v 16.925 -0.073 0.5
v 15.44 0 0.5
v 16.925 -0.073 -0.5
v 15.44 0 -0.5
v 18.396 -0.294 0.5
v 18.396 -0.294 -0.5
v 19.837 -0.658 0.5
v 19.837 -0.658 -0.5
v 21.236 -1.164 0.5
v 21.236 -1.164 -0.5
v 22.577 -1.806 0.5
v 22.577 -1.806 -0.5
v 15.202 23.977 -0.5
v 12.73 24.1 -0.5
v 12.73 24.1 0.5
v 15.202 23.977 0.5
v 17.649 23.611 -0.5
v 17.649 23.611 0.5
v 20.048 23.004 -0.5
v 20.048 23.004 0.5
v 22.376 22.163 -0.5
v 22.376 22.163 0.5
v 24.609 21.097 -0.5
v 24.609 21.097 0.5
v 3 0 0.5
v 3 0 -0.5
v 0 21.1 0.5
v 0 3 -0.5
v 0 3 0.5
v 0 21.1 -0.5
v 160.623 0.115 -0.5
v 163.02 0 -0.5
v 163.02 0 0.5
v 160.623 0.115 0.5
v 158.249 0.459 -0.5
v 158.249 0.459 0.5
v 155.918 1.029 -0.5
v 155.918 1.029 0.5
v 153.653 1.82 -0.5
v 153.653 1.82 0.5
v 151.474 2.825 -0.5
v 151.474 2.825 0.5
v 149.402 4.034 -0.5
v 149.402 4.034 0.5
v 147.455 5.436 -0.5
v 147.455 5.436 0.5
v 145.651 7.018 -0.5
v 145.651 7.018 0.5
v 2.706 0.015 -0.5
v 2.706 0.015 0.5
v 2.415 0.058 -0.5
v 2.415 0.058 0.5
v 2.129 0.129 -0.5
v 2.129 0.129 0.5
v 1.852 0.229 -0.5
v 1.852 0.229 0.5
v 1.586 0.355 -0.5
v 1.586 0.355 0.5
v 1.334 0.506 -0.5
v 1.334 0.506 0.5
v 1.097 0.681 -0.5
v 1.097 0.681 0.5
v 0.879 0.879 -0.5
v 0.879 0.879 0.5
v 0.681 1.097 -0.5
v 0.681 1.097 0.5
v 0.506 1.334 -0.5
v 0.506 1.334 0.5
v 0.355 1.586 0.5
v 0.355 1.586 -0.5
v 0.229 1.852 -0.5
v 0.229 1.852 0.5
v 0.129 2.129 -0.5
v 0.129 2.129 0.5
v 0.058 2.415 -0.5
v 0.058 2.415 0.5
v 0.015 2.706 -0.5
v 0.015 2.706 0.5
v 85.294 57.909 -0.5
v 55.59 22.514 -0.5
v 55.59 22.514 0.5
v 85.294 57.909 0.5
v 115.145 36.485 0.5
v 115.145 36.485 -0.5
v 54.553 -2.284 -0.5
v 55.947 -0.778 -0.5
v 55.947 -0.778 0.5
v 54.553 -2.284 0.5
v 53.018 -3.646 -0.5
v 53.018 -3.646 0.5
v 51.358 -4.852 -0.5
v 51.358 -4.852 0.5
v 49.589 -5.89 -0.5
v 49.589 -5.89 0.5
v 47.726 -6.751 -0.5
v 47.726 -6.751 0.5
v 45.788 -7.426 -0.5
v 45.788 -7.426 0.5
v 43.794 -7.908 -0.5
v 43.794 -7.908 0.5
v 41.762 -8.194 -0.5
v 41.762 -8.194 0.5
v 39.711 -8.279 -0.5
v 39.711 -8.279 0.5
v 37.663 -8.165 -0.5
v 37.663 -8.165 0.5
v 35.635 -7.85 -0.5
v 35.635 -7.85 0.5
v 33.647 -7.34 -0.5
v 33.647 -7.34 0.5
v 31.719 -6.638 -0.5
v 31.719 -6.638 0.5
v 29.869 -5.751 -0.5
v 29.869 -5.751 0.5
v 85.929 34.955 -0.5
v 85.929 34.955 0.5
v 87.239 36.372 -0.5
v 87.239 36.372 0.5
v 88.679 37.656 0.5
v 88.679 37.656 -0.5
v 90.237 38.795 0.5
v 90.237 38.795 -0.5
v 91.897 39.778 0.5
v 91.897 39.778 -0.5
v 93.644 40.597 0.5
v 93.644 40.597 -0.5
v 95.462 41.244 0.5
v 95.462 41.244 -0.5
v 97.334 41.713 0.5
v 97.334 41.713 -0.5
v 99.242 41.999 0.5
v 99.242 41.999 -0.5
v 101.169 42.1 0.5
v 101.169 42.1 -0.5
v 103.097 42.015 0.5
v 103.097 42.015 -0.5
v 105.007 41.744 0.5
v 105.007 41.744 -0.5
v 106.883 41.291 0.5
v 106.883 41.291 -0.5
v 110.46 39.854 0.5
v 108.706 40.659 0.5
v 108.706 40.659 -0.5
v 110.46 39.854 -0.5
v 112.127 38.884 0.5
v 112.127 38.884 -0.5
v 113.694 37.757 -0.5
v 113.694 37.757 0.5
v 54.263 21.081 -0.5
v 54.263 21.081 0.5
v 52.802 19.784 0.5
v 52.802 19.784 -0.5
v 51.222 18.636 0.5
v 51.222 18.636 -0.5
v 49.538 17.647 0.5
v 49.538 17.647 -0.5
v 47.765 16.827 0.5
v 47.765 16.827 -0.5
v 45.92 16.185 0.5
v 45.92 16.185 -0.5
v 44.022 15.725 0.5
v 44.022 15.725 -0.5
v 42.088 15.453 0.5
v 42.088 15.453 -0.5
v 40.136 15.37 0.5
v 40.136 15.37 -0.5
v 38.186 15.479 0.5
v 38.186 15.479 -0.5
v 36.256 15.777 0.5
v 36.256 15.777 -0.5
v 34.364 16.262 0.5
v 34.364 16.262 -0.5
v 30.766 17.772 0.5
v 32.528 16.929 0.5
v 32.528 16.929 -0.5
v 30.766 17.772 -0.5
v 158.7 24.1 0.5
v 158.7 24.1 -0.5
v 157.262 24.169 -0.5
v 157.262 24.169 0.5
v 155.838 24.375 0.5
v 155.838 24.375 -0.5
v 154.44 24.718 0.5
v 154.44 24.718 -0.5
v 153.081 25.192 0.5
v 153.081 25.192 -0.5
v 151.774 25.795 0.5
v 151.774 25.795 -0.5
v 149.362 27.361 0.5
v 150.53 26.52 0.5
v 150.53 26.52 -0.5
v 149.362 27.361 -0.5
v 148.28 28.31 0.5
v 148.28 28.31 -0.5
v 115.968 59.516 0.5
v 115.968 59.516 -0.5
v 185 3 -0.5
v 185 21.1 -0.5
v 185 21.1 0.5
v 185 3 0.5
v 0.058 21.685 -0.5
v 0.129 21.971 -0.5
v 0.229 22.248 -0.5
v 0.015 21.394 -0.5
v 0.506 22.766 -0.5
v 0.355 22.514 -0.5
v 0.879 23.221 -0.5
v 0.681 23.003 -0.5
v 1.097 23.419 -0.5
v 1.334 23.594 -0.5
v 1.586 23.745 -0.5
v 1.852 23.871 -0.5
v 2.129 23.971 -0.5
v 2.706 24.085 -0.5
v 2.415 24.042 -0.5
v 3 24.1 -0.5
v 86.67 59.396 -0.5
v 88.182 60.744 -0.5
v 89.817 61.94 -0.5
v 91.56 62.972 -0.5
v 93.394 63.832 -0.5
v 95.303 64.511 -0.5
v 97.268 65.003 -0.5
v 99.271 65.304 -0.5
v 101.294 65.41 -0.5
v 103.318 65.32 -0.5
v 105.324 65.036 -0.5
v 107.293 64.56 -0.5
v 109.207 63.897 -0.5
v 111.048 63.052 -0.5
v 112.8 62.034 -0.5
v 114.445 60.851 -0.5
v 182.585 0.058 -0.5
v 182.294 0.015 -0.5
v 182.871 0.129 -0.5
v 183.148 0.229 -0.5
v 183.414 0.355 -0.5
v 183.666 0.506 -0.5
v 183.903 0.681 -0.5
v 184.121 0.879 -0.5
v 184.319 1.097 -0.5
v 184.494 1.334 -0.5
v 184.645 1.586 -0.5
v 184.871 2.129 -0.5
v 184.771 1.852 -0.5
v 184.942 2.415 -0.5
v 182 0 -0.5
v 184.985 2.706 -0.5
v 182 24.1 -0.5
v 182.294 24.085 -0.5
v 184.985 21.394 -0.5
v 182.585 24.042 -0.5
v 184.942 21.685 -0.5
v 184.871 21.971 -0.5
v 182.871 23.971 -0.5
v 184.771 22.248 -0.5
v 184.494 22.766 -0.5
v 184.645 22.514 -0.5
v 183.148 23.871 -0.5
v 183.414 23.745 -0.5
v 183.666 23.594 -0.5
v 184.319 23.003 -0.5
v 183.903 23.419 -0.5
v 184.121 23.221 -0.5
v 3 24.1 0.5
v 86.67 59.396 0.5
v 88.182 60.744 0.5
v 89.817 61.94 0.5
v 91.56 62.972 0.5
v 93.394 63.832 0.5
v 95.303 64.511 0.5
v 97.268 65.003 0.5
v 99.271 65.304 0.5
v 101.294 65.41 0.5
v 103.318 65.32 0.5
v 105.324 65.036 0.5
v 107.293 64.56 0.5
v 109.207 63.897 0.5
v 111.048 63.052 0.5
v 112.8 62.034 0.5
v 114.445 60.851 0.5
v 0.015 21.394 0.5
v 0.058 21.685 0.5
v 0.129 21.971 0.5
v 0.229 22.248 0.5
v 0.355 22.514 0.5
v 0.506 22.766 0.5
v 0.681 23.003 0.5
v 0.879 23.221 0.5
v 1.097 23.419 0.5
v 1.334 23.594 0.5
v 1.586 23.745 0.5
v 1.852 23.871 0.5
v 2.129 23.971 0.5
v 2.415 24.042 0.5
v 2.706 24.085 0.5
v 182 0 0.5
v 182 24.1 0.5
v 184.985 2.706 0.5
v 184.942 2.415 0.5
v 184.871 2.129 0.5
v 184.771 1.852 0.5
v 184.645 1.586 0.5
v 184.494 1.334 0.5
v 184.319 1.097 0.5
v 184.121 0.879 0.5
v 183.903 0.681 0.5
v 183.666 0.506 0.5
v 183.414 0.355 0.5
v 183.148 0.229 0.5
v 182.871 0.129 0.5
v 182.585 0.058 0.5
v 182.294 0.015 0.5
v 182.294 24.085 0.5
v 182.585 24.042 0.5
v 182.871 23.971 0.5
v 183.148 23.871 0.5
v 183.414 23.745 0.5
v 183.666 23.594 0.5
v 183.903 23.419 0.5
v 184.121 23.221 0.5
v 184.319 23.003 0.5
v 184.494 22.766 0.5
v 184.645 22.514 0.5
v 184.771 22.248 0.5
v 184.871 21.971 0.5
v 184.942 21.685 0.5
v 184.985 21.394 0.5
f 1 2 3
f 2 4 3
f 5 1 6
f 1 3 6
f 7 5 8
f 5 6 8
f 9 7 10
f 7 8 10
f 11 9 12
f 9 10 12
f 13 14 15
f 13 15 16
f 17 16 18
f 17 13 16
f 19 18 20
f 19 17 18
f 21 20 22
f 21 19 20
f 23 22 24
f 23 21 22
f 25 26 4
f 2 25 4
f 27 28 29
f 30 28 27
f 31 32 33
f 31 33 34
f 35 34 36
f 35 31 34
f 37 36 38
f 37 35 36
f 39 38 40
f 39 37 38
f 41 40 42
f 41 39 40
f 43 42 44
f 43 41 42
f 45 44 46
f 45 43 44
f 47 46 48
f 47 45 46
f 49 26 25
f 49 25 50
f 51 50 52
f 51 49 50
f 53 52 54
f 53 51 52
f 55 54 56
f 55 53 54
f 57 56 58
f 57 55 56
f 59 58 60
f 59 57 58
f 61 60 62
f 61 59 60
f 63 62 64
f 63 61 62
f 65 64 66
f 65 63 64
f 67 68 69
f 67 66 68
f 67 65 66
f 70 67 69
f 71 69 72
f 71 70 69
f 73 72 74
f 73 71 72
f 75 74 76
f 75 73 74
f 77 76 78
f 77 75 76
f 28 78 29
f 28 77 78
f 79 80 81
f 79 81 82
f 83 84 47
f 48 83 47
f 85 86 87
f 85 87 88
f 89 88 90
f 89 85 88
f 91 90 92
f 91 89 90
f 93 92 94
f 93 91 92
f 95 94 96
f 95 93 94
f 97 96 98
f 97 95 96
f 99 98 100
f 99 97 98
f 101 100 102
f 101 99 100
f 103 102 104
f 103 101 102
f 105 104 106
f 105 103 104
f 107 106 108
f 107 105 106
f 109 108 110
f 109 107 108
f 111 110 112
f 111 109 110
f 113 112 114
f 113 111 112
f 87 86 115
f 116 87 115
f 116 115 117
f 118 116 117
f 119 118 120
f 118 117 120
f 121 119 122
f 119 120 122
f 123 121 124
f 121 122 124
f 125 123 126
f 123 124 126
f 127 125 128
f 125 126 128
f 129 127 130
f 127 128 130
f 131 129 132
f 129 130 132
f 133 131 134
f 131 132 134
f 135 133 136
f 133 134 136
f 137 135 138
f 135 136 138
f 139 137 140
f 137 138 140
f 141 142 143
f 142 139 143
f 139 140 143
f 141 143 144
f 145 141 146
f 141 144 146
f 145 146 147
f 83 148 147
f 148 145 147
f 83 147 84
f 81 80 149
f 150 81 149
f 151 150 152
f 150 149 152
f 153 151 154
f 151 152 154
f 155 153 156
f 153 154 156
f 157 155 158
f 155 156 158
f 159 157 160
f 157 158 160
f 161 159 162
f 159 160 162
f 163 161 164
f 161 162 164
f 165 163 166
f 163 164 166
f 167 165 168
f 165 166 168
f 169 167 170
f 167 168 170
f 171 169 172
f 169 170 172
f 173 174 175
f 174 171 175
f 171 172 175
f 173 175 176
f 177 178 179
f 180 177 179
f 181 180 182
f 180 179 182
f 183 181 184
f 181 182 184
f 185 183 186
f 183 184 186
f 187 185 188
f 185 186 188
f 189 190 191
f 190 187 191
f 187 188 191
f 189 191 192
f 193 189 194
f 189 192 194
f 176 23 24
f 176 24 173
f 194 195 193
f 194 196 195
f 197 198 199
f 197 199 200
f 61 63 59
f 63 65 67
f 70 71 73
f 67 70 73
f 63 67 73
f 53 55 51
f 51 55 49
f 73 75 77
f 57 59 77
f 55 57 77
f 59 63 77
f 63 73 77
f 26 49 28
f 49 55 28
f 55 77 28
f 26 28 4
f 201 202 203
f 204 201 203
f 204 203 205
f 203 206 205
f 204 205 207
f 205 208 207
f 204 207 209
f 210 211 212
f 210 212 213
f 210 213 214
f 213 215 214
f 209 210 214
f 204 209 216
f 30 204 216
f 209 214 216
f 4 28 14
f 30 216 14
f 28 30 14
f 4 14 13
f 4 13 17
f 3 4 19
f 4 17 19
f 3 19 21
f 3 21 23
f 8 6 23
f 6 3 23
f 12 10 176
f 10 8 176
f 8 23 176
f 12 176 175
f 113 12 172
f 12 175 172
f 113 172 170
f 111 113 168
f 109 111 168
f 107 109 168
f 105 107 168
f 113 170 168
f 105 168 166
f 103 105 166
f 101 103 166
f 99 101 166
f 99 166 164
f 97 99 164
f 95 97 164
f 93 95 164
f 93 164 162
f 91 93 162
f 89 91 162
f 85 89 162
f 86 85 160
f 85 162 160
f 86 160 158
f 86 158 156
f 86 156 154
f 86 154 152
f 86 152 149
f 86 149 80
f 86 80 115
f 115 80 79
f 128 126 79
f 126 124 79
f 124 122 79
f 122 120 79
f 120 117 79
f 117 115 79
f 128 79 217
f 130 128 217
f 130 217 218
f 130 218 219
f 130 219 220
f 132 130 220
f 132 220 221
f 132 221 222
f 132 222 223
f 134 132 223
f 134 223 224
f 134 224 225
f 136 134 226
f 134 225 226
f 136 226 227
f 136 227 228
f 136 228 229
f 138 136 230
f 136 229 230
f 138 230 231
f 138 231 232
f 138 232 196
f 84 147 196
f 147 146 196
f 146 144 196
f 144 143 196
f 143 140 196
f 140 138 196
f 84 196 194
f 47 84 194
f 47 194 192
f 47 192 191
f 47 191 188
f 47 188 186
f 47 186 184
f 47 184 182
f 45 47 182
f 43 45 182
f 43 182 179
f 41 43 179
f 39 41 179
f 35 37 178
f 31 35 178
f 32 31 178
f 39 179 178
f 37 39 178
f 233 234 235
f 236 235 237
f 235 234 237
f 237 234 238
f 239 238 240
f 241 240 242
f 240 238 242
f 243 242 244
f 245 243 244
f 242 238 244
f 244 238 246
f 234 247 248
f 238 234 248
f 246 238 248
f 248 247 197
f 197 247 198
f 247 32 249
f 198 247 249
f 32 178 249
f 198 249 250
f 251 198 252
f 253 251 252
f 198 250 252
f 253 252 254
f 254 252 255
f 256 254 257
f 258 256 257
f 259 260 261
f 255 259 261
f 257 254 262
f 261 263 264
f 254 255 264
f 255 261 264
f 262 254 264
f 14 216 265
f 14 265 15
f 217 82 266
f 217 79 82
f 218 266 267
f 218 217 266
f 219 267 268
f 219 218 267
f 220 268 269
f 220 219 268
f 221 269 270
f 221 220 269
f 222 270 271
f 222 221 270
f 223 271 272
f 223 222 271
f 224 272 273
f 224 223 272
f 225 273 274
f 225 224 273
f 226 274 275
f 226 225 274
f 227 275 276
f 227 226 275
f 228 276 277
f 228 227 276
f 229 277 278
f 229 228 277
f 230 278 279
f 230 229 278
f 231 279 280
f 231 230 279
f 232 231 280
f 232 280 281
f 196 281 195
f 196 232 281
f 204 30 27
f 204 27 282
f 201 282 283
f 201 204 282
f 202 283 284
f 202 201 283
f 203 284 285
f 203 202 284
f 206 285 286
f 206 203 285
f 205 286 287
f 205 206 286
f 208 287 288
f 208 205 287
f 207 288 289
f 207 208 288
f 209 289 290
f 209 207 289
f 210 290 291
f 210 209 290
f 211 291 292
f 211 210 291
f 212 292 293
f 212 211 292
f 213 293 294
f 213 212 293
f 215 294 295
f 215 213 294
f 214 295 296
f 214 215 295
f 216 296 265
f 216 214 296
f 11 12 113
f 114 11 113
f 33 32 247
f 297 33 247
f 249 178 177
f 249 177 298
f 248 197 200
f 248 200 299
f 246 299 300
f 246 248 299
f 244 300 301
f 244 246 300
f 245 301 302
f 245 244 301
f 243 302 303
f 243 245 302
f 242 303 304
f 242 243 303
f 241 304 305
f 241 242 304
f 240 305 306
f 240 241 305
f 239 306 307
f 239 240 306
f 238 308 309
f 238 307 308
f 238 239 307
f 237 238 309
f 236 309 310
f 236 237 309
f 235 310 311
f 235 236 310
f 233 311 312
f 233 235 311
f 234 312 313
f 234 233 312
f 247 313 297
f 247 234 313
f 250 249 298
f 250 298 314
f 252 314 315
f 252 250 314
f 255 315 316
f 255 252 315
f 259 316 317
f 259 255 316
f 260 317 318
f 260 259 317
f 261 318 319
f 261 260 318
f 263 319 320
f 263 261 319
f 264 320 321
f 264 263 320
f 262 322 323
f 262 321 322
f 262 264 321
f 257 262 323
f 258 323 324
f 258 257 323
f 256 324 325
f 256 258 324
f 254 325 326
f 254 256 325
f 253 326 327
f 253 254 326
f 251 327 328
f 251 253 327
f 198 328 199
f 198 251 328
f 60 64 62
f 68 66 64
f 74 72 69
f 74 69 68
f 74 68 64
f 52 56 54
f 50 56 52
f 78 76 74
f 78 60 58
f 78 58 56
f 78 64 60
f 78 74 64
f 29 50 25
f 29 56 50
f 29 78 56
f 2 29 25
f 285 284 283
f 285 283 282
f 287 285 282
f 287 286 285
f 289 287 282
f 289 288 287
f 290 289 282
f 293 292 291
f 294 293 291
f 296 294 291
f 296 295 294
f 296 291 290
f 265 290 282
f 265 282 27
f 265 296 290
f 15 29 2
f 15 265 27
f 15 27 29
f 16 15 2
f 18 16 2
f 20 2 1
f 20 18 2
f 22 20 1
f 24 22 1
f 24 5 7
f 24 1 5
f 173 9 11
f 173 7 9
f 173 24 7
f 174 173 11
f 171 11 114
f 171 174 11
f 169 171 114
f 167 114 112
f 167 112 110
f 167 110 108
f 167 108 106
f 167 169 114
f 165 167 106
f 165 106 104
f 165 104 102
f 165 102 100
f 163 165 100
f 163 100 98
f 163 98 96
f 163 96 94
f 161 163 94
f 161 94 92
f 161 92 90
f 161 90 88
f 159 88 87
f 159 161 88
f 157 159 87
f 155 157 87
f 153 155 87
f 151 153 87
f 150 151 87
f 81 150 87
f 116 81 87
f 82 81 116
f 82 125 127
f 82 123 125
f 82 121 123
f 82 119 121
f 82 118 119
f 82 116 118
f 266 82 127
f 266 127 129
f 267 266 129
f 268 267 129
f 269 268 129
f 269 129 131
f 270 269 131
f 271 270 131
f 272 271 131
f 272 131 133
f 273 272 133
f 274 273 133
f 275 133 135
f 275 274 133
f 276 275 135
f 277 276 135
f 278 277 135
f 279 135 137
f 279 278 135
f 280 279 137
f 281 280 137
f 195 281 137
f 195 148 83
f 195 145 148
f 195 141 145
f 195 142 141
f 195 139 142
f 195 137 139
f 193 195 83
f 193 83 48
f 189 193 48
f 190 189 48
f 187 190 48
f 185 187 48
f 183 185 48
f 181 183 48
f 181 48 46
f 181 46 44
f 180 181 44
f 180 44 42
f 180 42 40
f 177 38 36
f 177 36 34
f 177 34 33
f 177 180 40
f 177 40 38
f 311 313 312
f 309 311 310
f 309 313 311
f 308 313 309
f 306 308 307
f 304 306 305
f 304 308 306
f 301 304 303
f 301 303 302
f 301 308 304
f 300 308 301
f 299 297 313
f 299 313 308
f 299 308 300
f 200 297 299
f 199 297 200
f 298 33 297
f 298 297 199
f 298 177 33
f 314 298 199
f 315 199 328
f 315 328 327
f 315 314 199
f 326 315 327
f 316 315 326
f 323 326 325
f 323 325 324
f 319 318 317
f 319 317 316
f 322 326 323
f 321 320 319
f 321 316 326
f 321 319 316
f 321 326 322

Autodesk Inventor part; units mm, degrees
ref_plane "YZ Plane" through (0, 0, 0) normal (1, 0, 0) x (0, 1, 0)
ref_plane "XZ Plane" through (0, 0, 0) normal (0, 1, 0) x (-1, 0, 0)
ref_plane "XY Plane" through (0, 0, 0) normal (0, 0, 1) x (1, 0, 0)
sketch "Sketch1" plane through (0, 0, 0) normal (0, 0, 1) x (1, 0, 0)
  arc A0 (0, 3) -> (3, 0) centre (3.0011, 3.0011) ccw
  line L0 (3, 0) -> (15.44, 0)
  arc A1 (22.577, -1.806) -> (15.44, 0) centre (15.444, -14.9894) ccw
  line L1 (22.577, -1.806) -> (29.869, -5.751)
  arc A2 (29.869, -5.751) -> (55.947, -0.778) centre (39.8598, 12.7202) ccw
  line L2 (55.947, -0.778) -> (85.929, 34.955)
  arc A3 (115.145, 36.485) -> (85.929, 34.955) centre (101.2502, 22.1018) ccw
  line L3 (115.145, 36.485) -> (145.651, 7.018)
  arc A4 (145.651, 7.018) -> (163.02, 0) centre (163.0155, 24.9912) ccw
  line L4 (163.02, 0) -> (182, 0)
  arc A5 (182, 0) -> (185, 3) centre (181.9989, 3.0011) ccw
  line L5 (0, 3) -> (0, 21.1)
  arc A6 (3, 24.1) -> (0, 21.1) centre (3.0011, 21.0989) ccw
  line L6 (3, 24.1) -> (12.73, 24.1)
  arc A7 (24.609, 21.097) -> (12.73, 24.1) centre (12.7244, -0.9184) ccw
  line L7 (24.609, 21.097) -> (30.766, 17.772)
  arc A8 (30.766, 17.772) -> (55.59, 22.514) centre (40.2694, 35.3692) ccw
  line L8 (55.59, 22.514) -> (85.294, 57.909)
  arc A9 (115.968, 59.516) -> (85.294, 57.909) centre (101.3803, 44.4098) ccw
  line L9 (115.968, 59.516) -> (148.28, 28.31)
  arc A10 (148.28, 28.31) -> (158.7, 24.1) centre (158.6991, 39.0977) ccw
  line L10 (158.7, 24.1) -> (182, 24.1)
  arc A11 (185, 21.1) -> (182, 24.1) centre (181.9989, 21.0989) ccw
  line L11 (185, 21.1) -> (185, 3)
extrude "Extrusion1" add sketch "Sketch1" along normal mid plane 1
properties part number "Offset"
